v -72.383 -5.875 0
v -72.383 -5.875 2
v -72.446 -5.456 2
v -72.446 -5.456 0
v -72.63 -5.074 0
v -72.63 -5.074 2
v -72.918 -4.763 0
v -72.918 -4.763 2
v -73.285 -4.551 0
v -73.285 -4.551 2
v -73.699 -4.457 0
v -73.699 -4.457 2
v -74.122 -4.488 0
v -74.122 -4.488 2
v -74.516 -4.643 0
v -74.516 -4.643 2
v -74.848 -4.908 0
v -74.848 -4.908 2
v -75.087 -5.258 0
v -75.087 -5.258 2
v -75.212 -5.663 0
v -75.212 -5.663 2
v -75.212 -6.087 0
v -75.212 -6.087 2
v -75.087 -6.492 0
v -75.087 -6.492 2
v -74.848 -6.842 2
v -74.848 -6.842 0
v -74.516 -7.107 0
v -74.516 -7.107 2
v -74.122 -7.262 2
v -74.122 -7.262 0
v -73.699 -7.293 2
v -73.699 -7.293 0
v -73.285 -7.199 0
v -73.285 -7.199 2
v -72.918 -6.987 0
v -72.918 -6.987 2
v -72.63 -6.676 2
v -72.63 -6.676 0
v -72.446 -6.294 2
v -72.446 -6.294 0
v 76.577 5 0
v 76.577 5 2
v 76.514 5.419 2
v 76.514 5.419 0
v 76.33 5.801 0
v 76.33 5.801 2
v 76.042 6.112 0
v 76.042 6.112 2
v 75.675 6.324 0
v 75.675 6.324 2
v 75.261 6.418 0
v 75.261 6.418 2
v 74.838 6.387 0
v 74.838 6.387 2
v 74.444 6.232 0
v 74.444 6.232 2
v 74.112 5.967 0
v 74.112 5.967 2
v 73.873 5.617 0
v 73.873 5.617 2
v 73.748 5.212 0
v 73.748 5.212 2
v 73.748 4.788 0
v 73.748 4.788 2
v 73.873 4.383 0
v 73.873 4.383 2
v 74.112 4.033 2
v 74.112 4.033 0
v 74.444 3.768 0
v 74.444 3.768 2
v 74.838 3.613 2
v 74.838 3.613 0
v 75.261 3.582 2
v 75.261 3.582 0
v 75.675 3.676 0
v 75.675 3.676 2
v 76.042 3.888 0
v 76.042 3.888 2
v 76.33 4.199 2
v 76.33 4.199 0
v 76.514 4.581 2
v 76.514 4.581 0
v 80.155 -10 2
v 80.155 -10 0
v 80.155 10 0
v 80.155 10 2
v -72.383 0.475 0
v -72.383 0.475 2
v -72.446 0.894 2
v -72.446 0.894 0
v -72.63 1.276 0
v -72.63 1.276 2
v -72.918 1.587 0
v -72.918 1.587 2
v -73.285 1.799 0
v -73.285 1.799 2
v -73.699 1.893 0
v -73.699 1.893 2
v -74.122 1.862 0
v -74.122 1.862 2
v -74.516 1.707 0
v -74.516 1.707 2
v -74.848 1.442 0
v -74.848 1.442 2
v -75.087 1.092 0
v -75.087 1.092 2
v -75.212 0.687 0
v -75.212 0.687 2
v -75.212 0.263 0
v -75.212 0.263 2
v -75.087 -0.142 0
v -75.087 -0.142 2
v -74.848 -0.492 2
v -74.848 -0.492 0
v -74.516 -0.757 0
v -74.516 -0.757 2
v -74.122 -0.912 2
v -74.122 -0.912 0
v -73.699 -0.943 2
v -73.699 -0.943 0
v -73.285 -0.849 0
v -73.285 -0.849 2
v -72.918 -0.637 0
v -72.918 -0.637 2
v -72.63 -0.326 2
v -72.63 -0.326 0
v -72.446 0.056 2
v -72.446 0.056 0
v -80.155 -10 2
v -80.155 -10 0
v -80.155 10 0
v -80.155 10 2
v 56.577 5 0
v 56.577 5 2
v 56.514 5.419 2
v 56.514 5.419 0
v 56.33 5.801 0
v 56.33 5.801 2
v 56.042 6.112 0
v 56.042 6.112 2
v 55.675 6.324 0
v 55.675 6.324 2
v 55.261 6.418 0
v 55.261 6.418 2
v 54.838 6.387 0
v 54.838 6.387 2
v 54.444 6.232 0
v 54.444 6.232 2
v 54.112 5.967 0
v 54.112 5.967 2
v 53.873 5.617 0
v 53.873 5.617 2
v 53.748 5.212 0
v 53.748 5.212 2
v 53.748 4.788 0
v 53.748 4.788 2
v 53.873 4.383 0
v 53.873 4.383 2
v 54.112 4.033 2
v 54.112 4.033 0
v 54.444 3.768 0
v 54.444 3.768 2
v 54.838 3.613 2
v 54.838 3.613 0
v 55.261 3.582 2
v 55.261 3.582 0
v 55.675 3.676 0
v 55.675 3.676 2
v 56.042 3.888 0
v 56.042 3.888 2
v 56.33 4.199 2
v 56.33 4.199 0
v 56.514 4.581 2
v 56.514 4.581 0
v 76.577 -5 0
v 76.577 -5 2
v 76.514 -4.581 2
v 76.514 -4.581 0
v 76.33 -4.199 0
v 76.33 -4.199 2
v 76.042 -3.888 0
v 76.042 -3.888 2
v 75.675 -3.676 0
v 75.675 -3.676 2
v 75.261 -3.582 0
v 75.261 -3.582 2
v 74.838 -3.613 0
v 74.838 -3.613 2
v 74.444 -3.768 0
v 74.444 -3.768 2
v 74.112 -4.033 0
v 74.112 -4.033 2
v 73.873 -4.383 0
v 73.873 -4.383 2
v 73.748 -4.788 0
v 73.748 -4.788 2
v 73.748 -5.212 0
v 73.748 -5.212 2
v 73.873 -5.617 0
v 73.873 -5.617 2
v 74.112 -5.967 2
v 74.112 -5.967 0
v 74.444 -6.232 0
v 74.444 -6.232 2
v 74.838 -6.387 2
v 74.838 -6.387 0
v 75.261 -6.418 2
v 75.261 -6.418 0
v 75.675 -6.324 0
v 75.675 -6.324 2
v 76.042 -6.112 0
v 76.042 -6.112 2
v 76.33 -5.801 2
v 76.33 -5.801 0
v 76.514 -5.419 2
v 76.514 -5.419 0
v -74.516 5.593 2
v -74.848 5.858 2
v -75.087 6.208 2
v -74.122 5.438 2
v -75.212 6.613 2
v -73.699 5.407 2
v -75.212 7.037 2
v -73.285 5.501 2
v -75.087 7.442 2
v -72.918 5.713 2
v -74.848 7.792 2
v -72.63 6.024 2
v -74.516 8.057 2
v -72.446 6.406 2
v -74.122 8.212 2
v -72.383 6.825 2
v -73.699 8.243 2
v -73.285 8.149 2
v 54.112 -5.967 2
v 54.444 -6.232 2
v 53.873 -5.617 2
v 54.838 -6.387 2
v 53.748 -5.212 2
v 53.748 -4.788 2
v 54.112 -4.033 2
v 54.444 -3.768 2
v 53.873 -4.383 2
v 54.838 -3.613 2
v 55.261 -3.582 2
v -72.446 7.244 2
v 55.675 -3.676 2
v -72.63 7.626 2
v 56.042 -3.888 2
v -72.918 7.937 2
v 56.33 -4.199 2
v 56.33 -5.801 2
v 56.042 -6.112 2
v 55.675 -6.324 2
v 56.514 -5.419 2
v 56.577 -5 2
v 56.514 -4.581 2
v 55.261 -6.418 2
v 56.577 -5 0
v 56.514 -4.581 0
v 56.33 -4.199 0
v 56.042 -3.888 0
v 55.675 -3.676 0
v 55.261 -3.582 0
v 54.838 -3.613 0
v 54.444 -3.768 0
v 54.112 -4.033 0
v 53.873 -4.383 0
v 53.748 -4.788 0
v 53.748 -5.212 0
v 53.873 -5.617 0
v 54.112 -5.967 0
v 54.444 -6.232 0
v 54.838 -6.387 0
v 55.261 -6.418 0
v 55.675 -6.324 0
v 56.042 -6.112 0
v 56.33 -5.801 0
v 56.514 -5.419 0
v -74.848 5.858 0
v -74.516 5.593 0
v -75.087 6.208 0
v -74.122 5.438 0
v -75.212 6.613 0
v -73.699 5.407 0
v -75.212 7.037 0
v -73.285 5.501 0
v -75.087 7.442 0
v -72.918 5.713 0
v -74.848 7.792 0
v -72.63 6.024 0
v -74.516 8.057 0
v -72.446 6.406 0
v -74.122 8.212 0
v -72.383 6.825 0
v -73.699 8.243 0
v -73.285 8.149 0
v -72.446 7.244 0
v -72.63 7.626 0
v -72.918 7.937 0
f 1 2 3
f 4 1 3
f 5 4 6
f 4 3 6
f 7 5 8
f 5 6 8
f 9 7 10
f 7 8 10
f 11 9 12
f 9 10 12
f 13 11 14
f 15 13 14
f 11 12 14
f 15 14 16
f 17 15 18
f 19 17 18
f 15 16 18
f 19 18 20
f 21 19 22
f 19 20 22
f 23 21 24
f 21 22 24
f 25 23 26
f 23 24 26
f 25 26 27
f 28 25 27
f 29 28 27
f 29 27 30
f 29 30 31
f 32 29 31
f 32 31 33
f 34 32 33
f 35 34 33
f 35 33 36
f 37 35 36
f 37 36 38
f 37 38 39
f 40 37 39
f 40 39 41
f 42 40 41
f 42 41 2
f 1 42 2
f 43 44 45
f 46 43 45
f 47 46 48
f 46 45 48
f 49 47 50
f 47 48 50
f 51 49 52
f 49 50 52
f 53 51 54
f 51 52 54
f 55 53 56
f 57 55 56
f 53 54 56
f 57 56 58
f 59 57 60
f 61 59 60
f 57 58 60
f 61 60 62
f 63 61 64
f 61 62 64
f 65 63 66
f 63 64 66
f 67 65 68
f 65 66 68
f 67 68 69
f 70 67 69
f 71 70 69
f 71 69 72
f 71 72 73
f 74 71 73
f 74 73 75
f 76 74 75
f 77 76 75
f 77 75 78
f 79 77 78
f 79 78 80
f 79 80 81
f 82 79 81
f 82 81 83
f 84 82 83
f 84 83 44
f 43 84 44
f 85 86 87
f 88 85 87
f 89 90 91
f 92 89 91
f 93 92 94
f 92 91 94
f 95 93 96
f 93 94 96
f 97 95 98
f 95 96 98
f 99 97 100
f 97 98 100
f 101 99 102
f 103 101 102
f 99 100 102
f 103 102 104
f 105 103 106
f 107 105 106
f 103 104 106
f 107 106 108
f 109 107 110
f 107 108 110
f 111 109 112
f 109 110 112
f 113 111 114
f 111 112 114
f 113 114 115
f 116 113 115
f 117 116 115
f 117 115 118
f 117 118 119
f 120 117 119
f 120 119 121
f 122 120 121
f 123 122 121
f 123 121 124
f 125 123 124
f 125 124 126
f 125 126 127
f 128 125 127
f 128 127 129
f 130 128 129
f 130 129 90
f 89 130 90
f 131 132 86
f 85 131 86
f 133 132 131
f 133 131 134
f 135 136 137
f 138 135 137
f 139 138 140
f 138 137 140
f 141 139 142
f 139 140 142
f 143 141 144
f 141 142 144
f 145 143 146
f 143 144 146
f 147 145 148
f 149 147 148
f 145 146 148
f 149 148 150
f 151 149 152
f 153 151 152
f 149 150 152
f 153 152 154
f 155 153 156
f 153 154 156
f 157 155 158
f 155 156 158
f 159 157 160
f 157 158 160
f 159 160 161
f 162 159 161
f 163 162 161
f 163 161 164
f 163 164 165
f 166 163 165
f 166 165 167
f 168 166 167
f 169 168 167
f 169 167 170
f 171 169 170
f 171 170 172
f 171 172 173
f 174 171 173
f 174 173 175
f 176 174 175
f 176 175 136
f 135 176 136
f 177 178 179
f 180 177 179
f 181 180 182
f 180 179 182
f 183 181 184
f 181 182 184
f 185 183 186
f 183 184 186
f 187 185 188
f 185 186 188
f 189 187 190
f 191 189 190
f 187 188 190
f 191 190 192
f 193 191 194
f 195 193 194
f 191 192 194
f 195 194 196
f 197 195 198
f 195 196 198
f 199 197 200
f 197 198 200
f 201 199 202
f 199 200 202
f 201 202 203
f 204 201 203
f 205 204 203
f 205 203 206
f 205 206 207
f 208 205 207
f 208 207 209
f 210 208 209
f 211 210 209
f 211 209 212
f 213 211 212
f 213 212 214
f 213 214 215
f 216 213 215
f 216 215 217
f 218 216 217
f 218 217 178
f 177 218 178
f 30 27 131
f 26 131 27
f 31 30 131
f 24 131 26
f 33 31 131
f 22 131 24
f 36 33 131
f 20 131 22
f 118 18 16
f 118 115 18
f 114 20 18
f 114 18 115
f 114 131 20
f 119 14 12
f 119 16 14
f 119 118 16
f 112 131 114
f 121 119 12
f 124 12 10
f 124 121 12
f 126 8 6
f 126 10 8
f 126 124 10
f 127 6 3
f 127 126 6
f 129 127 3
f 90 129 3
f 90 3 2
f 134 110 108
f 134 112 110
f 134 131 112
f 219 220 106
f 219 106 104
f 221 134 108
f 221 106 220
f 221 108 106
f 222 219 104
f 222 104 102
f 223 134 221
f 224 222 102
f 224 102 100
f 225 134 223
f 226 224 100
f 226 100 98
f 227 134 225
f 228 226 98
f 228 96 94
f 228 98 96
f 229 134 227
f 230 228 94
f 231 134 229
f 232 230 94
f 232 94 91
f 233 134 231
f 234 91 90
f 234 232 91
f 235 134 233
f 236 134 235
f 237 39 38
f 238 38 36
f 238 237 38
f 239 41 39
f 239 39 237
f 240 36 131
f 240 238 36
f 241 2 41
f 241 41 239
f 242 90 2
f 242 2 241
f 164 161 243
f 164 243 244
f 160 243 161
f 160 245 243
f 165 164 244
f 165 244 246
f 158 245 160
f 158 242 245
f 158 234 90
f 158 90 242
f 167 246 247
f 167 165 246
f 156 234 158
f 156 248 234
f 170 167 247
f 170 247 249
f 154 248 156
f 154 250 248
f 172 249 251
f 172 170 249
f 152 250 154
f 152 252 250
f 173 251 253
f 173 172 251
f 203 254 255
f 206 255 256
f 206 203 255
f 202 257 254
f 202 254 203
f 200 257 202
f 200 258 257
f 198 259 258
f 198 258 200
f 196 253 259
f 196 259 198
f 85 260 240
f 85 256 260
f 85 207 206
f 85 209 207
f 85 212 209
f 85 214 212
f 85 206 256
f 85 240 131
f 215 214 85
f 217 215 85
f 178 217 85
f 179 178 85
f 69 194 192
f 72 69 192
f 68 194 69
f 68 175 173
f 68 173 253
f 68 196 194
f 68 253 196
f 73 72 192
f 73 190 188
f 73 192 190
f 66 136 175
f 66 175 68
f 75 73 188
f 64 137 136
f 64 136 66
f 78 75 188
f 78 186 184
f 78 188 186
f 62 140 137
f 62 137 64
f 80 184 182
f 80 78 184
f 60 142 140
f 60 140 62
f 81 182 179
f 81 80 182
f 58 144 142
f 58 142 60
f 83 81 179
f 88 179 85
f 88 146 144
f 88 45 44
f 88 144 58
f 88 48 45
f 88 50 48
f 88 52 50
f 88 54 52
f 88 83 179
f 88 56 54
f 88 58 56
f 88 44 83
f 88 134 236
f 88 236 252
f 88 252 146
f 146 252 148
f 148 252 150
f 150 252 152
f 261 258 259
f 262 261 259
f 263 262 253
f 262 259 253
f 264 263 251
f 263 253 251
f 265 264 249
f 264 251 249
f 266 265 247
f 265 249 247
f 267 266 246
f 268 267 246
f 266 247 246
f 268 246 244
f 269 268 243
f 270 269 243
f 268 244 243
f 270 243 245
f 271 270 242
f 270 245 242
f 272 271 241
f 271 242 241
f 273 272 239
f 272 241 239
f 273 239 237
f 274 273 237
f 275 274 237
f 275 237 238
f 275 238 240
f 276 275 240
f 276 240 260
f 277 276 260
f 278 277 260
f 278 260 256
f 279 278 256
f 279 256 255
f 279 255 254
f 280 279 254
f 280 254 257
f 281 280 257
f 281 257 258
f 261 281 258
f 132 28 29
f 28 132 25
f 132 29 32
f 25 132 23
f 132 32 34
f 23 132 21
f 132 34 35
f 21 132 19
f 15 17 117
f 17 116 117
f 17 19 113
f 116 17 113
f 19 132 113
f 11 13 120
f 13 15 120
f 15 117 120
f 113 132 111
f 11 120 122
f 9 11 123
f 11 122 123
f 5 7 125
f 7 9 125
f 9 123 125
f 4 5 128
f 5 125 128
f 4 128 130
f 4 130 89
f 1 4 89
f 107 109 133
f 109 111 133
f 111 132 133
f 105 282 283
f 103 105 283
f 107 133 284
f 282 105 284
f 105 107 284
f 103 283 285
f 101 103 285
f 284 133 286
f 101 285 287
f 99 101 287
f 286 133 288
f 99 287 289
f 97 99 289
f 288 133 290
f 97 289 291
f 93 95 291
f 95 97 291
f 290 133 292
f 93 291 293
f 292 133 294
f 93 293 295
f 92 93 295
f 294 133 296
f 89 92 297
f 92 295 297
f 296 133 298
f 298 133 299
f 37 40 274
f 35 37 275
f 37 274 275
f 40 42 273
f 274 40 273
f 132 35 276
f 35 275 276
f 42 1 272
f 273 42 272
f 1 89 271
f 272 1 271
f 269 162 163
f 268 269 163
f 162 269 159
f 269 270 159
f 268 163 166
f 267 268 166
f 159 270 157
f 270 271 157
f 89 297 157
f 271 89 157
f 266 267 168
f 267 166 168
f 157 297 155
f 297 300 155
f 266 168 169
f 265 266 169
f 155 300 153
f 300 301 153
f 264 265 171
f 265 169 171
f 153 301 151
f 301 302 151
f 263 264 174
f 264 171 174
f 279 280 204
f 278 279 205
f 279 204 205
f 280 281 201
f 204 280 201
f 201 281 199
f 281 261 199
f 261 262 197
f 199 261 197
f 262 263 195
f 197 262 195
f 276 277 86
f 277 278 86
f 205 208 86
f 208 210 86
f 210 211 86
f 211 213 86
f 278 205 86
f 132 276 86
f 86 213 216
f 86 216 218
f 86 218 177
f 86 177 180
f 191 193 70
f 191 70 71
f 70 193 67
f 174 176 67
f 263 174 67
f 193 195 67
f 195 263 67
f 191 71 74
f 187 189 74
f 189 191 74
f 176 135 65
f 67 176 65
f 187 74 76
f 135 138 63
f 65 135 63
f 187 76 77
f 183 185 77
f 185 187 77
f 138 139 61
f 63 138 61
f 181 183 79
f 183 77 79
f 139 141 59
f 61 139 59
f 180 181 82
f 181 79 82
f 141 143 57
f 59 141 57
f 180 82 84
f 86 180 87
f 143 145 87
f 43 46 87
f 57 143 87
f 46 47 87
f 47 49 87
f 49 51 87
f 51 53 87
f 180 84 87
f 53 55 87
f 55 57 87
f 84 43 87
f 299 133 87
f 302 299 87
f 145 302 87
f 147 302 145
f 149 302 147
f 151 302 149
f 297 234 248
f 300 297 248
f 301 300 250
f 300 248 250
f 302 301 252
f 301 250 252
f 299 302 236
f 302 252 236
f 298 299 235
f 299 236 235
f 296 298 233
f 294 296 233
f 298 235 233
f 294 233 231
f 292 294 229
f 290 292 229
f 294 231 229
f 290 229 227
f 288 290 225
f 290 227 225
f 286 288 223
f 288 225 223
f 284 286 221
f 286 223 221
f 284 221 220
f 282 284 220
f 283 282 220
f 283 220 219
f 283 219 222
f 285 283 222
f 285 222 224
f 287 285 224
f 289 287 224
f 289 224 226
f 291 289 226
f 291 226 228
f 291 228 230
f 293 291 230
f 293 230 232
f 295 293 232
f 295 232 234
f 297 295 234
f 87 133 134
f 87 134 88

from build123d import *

# Parameters (mm, degrees)
SKETCH1_W           = 160.31
SKETCH1_H           = 20
BOSS_EXTRUDE1_DEPTH = 2
CUT_EXTRUDE1_REACH  = 82.801
SKETCH2_R           = 1.4224


with BuildPart() as part:
    # Sketch1 → Boss-Extrude1 (new body)
    with BuildSketch(Plane.XY):
        Rectangle(SKETCH1_W, SKETCH1_H)
    extrude(amount=BOSS_EXTRUDE1_DEPTH)

    # Sketch2 → Cut-Extrude1 (cut, up to next)
    with BuildSketch(Plane.XY.offset(2), mode=Mode.PRIVATE) as cut_extrude1_sk1:
        with Locations((-73.805, 6.825)):
            Circle(SKETCH2_R)
    cut_extrude1_tool1 = extrude(cut_extrude1_sk1.sketch, amount=-CUT_EXTRUDE1_REACH, mode=Mode.PRIVATE) & part.part
    # Sketch2 → Cut-Extrude1 (cut, up to next)
    with BuildSketch(Plane.XY.offset(2), mode=Mode.PRIVATE) as cut_extrude1_sk2:
        with Locations((-73.805, 0.475)):
            Circle(SKETCH2_R)
    cut_extrude1_tool2 = extrude(cut_extrude1_sk2.sketch, amount=-CUT_EXTRUDE1_REACH, mode=Mode.PRIVATE) & part.part
    # Sketch2 → Cut-Extrude1 (cut, up to next)
    with BuildSketch(Plane.XY.offset(2), mode=Mode.PRIVATE) as cut_extrude1_sk3:
        with Locations((-73.805, -5.875)):
            Circle(SKETCH2_R)
    cut_extrude1_tool3 = extrude(cut_extrude1_sk3.sketch, amount=-CUT_EXTRUDE1_REACH, mode=Mode.PRIVATE) & part.part
    # Sketch2 → Cut-Extrude1 (cut, up to next)
    with BuildSketch(Plane.XY.offset(2), mode=Mode.PRIVATE) as cut_extrude1_sk4:
        with Locations((75.155, 5)):
            Circle(SKETCH2_R)
    cut_extrude1_tool4 = extrude(cut_extrude1_sk4.sketch, amount=-CUT_EXTRUDE1_REACH, mode=Mode.PRIVATE) & part.part
    # Sketch2 → Cut-Extrude1 (cut, up to next)
    with BuildSketch(Plane.XY.offset(2), mode=Mode.PRIVATE) as cut_extrude1_sk5:
        with Locations((55.155, 5)):
            Circle(SKETCH2_R)
    cut_extrude1_tool5 = extrude(cut_extrude1_sk5.sketch, amount=-CUT_EXTRUDE1_REACH, mode=Mode.PRIVATE) & part.part
    # Sketch2 → Cut-Extrude1 (cut, up to next)
    with BuildSketch(Plane.XY.offset(2), mode=Mode.PRIVATE) as cut_extrude1_sk6:
        with Locations((55.155, -5)):
            Circle(SKETCH2_R)
    cut_extrude1_tool6 = extrude(cut_extrude1_sk6.sketch, amount=-CUT_EXTRUDE1_REACH, mode=Mode.PRIVATE) & part.part
    # Sketch2 → Cut-Extrude1 (cut, up to next)
    with BuildSketch(Plane.XY.offset(2), mode=Mode.PRIVATE) as cut_extrude1_sk7:
        with Locations((75.155, -5)):
            Circle(SKETCH2_R)
    cut_extrude1_tool7 = extrude(cut_extrude1_sk7.sketch, amount=-CUT_EXTRUDE1_REACH, mode=Mode.PRIVATE) & part.part
    add(cut_extrude1_tool1.solids().sort_by_distance((-73.805, 6.825, 2))[0], mode=Mode.SUBTRACT)
    add(cut_extrude1_tool2.solids().sort_by_distance((-73.805, 0.475, 2))[0], mode=Mode.SUBTRACT)
    add(cut_extrude1_tool3.solids().sort_by_distance((-73.805, -5.875, 2))[0], mode=Mode.SUBTRACT)
    add(cut_extrude1_tool4.solids().sort_by_distance((75.155, 5, 2))[0], mode=Mode.SUBTRACT)
    add(cut_extrude1_tool5.solids().sort_by_distance((55.155, 5, 2))[0], mode=Mode.SUBTRACT)
    add(cut_extrude1_tool6.solids().sort_by_distance((55.155, -5, 2))[0], mode=Mode.SUBTRACT)
    add(cut_extrude1_tool7.solids().sort_by_distance((75.155, -5, 2))[0], mode=Mode.SUBTRACT)


solid = part.part
